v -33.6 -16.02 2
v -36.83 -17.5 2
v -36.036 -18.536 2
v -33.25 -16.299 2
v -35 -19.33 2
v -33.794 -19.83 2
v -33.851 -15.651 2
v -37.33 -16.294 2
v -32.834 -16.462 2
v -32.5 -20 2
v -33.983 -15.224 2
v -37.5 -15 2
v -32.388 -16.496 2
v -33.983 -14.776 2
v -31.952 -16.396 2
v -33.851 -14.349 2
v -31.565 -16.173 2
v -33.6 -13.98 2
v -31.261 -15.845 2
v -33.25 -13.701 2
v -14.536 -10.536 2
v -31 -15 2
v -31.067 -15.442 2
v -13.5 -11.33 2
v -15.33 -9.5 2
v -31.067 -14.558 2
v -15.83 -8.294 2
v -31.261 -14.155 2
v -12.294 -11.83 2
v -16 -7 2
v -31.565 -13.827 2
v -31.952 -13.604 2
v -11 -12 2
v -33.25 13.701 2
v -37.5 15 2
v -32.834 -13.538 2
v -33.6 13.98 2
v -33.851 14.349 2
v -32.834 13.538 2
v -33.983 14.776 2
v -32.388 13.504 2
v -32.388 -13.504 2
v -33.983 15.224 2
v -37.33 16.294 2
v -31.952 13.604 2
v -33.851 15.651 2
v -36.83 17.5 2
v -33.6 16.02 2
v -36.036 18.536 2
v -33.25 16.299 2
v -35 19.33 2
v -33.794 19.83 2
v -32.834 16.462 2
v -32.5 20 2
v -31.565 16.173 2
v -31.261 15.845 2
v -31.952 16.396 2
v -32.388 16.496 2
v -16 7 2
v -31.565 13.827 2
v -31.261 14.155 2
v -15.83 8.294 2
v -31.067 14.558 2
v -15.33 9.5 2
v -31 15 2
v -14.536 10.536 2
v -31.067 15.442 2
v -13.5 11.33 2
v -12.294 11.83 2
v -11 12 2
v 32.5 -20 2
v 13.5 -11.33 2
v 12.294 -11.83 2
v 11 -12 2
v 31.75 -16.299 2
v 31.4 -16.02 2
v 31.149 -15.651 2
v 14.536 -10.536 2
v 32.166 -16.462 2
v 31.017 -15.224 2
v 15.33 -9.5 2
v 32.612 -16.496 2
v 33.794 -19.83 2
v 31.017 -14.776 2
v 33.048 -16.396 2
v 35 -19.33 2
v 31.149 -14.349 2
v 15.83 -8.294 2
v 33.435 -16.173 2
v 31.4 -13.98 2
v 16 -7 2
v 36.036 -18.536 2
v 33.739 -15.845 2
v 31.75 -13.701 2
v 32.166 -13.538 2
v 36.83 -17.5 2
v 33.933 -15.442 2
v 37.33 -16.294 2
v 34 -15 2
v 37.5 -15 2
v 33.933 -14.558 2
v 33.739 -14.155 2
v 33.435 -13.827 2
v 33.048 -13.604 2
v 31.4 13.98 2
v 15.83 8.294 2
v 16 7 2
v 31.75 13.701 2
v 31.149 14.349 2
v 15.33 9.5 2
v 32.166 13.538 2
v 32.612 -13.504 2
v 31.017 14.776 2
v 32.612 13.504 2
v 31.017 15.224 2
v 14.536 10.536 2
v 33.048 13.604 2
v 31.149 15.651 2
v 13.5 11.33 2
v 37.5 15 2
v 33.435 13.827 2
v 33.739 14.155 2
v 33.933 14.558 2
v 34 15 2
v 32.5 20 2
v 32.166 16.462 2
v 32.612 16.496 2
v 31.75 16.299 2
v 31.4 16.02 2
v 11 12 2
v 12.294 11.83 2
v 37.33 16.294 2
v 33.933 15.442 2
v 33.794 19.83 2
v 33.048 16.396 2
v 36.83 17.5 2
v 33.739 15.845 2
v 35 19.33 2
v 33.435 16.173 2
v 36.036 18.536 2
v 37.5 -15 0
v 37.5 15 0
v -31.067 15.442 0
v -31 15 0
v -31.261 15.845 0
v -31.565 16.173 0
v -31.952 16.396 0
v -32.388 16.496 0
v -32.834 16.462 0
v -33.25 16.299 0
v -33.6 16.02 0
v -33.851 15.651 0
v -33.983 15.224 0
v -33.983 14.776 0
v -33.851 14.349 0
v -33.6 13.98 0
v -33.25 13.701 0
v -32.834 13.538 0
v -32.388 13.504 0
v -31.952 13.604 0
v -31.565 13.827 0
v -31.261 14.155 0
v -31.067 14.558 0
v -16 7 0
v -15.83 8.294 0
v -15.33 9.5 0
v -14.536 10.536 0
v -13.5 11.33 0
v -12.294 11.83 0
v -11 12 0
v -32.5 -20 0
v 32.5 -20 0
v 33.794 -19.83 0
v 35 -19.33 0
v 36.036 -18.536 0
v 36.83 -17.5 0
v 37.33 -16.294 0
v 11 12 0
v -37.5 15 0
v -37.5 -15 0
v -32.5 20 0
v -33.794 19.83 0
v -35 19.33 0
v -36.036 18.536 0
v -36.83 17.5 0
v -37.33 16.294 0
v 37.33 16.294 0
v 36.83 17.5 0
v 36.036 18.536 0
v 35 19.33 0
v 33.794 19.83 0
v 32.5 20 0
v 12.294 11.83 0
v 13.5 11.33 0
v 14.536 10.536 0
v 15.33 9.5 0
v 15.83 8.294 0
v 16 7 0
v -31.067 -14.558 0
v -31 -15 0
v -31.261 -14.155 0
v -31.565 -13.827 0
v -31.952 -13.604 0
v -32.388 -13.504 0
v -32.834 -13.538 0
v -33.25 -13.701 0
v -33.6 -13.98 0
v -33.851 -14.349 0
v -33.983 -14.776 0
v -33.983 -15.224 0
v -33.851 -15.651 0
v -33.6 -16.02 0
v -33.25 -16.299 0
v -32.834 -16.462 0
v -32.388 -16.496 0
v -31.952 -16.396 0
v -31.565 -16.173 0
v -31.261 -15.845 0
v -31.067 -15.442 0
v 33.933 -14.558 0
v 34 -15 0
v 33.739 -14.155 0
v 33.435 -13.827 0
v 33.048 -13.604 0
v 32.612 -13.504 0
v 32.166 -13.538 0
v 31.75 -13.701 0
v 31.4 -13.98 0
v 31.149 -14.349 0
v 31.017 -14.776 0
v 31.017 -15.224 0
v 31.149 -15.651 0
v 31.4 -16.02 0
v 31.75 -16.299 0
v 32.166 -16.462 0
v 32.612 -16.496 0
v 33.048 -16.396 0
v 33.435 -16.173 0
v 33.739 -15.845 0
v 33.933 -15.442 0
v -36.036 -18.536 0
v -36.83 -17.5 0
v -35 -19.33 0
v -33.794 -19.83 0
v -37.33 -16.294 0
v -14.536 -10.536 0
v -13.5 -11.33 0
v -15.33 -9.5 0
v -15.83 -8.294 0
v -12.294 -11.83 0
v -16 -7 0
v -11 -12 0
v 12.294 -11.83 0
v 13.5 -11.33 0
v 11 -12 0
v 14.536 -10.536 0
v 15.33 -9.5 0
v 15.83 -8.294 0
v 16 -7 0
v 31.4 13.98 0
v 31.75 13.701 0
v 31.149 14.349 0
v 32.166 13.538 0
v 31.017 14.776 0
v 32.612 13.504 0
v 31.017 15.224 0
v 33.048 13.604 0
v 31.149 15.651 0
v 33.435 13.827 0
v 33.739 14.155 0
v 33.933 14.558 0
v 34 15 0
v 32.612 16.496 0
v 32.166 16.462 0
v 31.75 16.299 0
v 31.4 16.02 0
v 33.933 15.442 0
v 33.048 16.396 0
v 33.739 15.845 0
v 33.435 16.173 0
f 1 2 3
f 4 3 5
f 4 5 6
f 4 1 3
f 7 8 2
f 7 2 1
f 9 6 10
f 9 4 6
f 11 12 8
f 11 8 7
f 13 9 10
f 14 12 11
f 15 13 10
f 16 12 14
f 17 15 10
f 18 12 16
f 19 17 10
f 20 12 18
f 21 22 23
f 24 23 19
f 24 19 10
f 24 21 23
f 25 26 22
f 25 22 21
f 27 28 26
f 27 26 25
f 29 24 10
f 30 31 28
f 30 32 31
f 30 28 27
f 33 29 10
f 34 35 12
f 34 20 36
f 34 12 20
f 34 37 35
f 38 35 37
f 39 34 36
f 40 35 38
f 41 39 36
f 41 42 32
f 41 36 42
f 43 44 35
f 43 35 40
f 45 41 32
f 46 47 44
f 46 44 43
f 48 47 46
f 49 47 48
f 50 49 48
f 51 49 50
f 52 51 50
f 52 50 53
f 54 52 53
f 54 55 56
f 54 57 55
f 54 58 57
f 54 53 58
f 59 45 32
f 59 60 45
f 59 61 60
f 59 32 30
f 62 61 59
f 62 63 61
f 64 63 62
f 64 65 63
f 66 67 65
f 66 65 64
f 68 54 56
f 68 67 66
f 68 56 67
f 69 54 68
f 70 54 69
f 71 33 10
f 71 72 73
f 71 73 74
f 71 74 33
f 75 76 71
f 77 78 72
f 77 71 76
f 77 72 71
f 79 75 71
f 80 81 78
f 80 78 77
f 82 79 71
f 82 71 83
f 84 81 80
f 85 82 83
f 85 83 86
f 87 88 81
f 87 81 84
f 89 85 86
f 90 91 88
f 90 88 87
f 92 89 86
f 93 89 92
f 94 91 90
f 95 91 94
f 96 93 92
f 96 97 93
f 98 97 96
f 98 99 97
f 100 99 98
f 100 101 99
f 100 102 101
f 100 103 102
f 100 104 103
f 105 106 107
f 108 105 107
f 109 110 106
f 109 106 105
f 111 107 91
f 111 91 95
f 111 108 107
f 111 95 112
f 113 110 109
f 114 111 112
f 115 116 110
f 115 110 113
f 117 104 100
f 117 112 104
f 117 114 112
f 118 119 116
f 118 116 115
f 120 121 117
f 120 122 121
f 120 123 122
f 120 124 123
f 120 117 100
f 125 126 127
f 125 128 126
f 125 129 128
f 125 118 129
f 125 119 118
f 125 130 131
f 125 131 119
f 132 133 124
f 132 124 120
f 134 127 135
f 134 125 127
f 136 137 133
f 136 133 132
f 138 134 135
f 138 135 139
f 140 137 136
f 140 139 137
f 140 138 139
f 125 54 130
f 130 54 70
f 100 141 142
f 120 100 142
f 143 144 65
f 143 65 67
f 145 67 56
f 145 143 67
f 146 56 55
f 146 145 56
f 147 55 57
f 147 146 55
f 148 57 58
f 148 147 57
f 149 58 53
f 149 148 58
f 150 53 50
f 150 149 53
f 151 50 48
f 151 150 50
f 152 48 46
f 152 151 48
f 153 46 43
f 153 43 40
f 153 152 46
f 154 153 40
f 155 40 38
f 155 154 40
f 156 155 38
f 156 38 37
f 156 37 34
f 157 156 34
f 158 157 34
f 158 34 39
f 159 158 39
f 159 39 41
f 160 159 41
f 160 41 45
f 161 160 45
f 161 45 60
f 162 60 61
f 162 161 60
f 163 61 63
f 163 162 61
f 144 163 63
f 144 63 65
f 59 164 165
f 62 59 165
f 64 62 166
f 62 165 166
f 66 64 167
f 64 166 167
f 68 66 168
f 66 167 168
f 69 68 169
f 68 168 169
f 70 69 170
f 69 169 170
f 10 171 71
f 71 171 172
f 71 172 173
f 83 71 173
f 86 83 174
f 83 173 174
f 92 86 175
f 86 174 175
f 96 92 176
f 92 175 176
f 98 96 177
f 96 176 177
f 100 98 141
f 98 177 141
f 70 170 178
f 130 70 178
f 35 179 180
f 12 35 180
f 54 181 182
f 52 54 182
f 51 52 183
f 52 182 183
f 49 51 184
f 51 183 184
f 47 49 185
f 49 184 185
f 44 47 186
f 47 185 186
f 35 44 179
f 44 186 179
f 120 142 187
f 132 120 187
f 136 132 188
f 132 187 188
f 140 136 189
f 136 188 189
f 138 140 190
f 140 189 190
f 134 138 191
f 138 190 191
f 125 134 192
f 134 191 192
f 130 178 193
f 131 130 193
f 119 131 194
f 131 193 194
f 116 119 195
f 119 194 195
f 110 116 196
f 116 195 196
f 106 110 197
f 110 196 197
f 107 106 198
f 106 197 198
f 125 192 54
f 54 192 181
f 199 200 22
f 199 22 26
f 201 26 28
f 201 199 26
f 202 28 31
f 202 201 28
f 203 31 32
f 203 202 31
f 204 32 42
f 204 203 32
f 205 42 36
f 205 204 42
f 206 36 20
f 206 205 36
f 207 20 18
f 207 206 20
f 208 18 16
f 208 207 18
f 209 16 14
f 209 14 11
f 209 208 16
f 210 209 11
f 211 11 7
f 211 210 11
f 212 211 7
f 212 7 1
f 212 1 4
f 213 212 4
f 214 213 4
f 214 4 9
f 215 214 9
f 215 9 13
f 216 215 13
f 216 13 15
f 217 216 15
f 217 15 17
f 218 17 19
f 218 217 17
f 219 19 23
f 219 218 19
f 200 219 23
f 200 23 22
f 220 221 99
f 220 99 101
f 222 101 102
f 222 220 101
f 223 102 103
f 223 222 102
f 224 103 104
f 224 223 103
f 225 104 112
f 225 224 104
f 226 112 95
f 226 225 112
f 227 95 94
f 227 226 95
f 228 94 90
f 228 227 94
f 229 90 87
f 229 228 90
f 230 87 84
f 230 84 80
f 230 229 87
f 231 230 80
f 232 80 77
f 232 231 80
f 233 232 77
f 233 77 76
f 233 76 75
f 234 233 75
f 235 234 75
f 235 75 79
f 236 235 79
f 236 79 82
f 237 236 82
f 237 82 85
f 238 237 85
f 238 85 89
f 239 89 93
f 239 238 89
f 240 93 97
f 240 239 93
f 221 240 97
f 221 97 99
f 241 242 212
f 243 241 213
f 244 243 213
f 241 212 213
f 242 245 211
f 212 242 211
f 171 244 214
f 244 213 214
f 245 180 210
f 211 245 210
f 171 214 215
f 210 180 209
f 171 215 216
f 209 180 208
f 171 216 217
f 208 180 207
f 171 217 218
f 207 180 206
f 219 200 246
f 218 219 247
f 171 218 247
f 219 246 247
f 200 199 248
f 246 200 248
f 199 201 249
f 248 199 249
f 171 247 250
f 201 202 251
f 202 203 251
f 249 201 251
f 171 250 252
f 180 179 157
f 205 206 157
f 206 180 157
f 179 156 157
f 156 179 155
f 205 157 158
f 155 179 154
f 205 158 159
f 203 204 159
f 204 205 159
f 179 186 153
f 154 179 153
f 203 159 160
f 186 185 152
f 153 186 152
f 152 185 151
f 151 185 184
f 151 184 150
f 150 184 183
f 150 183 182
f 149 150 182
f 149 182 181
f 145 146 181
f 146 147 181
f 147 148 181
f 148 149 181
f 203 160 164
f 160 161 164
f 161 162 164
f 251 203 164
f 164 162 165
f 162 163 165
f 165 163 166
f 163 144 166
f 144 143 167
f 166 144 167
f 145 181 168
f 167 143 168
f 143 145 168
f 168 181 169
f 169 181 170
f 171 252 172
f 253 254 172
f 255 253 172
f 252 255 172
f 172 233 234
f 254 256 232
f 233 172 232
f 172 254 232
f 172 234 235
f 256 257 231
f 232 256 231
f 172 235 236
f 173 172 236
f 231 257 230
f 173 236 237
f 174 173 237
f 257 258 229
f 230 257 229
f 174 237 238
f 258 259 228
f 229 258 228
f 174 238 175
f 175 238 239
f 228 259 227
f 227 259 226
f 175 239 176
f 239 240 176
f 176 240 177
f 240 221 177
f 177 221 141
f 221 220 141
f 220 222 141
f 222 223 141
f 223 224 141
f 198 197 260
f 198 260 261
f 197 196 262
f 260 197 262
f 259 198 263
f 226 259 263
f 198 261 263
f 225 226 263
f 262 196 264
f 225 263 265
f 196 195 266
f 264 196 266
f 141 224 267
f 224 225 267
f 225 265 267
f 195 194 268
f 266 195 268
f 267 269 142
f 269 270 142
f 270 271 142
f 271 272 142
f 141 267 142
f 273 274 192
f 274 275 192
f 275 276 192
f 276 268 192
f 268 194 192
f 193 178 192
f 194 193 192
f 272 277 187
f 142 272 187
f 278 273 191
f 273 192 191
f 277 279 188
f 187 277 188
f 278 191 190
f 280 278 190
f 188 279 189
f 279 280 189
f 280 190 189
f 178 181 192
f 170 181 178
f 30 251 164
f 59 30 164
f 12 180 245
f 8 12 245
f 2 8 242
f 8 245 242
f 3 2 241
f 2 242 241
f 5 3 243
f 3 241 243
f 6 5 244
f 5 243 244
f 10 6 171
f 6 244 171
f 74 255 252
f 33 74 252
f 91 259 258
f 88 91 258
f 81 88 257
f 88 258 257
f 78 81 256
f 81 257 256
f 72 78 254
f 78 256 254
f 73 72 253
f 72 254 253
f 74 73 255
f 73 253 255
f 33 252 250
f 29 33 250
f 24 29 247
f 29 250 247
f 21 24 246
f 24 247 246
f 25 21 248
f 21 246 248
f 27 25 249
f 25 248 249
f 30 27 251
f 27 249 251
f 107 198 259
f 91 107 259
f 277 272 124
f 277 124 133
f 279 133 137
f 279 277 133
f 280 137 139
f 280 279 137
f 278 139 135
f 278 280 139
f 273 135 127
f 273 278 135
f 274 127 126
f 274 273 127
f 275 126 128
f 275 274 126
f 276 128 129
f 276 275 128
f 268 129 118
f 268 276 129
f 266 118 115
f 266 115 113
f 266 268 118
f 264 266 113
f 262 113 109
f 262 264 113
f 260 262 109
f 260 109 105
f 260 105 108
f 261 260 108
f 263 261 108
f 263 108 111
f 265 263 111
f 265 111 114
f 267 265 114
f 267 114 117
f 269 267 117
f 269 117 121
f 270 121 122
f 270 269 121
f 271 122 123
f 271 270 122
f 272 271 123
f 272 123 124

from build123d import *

# Parameters (mm, degrees)
SKETCH1_R           = 1.5
BOSS_EXTRUDE1_DEPTH = 2


with BuildPart() as part:
    # Sketch1 → Boss-Extrude1 (new body)
    with BuildSketch(Plane.XY):
        with BuildLine():
            Line((32.5, 20), (-32.5, 20))
            ThreePointArc((-32.5, 20), (-36.035533906, 18.535533906), (-37.5, 15))
            Line((-37.5, 15), (-37.5, -15))
            ThreePointArc((-37.5, -15), (-36.035533906, -18.535533906), (-32.5, -20))
            Line((-32.5, -20), (32.5, -20))
            ThreePointArc((32.5, -20), (36.035533906, -18.535533906), (37.5, -15))
            Line((37.5, -15), (37.5, 15))
            ThreePointArc((37.5, 15), (36.035533906, 18.535533906), (32.5, 20))
        make_face()
        with Locations((-32.5, -15)):
            Circle(SKETCH1_R, mode=Mode.SUBTRACT)
        with Locations((-32.5, 15)):
            Circle(SKETCH1_R, mode=Mode.SUBTRACT)
        with Locations((32.5, 15)):
            Circle(SKETCH1_R, mode=Mode.SUBTRACT)
        with Locations((32.5, -15)):
            Circle(SKETCH1_R, mode=Mode.SUBTRACT)
        with BuildLine():
            Line((-11, 12), (11, 12))
            ThreePointArc((11, 12), (14.535533906, 10.535533906), (16, 7))
            Line((16, 7), (16, -7))
            ThreePointArc((16, -7), (14.535533906, -10.535533906), (11, -12))
            Line((11, -12), (-11, -12))
            ThreePointArc((-11, -12), (-14.535533906, -10.535533906), (-16, -7))
            Line((-16, -7), (-16, 7))
            ThreePointArc((-16, 7), (-14.535533906, 10.535533906), (-11, 12))
        make_face(mode=Mode.SUBTRACT)
    extrude(amount=BOSS_EXTRUDE1_DEPTH)


solid = part.part
